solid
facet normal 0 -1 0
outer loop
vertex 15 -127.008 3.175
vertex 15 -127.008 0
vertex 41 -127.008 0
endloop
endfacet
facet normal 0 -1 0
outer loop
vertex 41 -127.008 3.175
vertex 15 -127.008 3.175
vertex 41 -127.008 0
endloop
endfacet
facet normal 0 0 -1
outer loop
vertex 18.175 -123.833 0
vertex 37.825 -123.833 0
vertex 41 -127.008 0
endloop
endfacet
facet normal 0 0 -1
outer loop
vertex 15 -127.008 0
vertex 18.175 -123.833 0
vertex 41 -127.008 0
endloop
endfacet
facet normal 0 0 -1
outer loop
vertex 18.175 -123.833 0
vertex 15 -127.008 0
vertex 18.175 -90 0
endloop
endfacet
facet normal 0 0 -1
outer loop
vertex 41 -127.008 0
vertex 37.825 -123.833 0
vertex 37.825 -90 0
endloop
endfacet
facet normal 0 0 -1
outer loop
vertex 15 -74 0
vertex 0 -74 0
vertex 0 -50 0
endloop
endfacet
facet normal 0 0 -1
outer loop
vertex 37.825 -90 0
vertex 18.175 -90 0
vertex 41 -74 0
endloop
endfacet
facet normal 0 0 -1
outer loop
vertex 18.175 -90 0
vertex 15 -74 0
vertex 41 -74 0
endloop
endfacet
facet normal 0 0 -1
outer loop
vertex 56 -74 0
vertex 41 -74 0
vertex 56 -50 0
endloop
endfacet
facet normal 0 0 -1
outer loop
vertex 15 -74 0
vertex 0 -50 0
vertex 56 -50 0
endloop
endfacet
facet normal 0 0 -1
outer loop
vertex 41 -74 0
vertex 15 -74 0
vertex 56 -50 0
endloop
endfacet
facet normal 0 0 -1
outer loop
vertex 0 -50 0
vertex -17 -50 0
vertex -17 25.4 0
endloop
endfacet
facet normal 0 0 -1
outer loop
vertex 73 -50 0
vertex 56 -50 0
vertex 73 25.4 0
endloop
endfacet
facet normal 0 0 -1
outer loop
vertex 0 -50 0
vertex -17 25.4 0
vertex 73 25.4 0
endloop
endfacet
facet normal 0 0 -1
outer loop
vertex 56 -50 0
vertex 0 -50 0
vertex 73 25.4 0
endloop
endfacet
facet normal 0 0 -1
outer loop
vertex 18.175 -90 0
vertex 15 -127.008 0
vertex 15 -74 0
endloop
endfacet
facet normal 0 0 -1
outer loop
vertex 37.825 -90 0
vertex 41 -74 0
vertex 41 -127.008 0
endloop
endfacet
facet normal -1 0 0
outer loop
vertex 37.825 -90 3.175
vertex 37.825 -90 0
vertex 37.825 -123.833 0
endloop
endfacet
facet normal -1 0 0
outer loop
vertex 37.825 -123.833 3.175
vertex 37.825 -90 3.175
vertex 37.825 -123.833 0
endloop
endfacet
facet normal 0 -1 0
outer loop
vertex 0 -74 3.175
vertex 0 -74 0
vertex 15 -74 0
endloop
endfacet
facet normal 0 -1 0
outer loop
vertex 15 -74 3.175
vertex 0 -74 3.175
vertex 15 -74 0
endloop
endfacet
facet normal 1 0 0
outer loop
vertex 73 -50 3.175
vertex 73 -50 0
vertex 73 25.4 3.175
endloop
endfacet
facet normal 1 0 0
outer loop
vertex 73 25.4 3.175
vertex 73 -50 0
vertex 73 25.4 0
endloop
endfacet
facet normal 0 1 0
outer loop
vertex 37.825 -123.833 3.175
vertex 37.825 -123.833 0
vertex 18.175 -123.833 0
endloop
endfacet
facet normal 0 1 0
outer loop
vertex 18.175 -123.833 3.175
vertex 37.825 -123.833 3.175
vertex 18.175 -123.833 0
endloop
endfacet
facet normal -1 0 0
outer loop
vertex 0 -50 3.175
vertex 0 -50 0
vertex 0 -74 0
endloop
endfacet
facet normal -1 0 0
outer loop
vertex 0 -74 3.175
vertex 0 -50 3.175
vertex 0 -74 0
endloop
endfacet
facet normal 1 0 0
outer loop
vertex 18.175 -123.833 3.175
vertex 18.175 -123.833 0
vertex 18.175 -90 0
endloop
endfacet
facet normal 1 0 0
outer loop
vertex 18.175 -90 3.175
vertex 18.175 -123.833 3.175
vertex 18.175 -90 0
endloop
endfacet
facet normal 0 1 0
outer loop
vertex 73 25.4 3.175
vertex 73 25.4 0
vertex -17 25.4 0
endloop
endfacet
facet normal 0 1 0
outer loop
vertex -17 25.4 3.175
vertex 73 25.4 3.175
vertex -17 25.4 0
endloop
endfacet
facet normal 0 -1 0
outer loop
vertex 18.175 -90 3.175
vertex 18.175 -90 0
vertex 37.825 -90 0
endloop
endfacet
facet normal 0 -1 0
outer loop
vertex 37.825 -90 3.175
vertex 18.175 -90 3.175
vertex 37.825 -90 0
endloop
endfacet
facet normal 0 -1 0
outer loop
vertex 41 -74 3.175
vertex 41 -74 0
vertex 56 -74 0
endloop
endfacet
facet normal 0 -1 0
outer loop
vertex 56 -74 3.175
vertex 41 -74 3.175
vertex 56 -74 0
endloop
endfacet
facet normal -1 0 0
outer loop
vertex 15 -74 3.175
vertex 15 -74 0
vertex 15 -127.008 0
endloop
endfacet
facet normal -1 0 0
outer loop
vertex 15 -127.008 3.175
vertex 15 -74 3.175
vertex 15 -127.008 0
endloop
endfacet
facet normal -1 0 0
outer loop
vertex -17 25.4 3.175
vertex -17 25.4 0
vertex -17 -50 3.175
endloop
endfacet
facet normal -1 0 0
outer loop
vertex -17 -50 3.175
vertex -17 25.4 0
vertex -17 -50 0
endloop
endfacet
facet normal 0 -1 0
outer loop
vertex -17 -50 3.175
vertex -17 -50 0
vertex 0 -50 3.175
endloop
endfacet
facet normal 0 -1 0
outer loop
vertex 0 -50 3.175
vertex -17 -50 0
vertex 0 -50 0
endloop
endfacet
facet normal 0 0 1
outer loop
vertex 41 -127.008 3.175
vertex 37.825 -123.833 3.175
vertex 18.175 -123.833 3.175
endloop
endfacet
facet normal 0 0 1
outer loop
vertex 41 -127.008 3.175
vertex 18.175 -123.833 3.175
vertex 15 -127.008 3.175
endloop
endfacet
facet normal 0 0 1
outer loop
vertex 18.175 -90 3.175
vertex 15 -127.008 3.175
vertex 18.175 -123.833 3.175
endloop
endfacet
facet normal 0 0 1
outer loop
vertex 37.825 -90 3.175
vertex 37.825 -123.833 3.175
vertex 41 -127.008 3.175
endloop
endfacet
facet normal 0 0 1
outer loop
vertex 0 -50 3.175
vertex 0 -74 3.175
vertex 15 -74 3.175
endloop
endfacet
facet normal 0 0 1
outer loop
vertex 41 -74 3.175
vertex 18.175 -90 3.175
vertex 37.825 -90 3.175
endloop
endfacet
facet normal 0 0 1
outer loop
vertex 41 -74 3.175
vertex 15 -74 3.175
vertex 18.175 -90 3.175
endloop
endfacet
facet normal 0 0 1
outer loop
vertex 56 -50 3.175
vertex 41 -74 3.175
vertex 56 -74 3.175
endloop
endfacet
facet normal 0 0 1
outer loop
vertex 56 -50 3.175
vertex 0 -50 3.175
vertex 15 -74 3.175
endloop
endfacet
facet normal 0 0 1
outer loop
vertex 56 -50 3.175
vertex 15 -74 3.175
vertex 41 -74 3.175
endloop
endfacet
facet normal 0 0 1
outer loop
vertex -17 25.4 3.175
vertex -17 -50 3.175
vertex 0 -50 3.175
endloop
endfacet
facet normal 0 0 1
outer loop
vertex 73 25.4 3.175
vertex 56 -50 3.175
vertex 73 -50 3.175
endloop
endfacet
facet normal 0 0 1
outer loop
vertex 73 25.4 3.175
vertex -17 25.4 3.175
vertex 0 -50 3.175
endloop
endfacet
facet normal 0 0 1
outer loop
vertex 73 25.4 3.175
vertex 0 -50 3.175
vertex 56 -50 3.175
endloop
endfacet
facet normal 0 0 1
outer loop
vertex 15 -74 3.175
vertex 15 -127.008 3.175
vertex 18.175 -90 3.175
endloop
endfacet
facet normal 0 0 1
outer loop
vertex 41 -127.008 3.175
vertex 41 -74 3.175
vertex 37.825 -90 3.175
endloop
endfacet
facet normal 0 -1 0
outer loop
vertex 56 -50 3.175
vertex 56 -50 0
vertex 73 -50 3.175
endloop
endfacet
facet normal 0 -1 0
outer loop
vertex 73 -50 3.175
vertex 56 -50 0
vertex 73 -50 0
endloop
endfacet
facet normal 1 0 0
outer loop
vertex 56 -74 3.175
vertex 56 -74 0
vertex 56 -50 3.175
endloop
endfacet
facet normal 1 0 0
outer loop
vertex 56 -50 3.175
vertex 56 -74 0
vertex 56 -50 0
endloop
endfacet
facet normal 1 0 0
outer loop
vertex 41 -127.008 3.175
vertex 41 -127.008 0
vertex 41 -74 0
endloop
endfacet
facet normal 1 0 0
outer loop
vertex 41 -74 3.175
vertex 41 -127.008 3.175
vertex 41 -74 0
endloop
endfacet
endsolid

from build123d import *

# Parameters (mm, degrees)
F0_W     = 3.175
F0_H     = 25.4
F0_H_2   = 33.8328
F0_H_3   = 3.175
F1_DEPTH = 3.175
F2_DEPTH = 25.4


# Not quite as in the source:
# - a length typed as a fraction of an inch, garbled in the dataset ("3 / 203.2 mm" for 3/8 in), is restored


with BuildPart() as f1:
    # F0 (on Top) → F1 (new body)
    with BuildSketch(Plane.XY):
        Polygon((-13.825, 0), (0, 0), (56, 0), (69.825, 0), (69.825, 25.4), (-13.825, 25.4), align=None)
        Polygon((56, 0), (0, 0), (0, -23), (0, -50), (0, -74), (15, -74), (28, -74), (41, -74), (56, -74), (56, -50), (56, -23), align=None)
        Polygon((0, -23), (0, 0), (-13.825, 0), (-17, 0), (-17, -50), (0, -50), align=None)
        Polygon((69.825, 0), (56, 0), (56, -23), (56, -50), (73, -50), (73, 0), align=None)
        with Locations((-15.4125, 12.7)):
            Rectangle(F0_W, F0_H)
        with Locations((71.4125, 12.7)):
            Rectangle(F0_W, F0_H)
        Polygon((28, -74), (15, -74), (15, -90), (18.175, -90), (21.35, -90), (28, -90), (34.65, -90), (37.825, -90), (41, -90), (41, -74), align=None)
        with Locations((16.5875, -106.9164)):
            Rectangle(F0_W, F0_H_2)
        with Locations((39.4125, -106.9164)):
            Rectangle(F0_W, F0_H_2)
        with Locations((16.5875, -125.4203)):
            Rectangle(F0_W, F0_H_3)
        with Locations((39.4125, -125.4203)):
            Rectangle(F0_W, F0_H_3)
        Polygon((21.35, -123.8328), (18.175, -123.8328), (18.175, -127.0078), (37.825, -127.0078), (37.825, -123.8328), (34.65, -123.8328), align=None)
    extrude(amount=F1_DEPTH)

    # F0 (on Top) → F2 (cut)
    with BuildSketch(Plane.XY):
        Polygon((28, -90), (21.35, -90), (21.35, -123.8328), (34.65, -123.8328), (34.65, -90), align=None)
    extrude(amount=-F2_DEPTH, mode=Mode.SUBTRACT)


solid = f1.part
